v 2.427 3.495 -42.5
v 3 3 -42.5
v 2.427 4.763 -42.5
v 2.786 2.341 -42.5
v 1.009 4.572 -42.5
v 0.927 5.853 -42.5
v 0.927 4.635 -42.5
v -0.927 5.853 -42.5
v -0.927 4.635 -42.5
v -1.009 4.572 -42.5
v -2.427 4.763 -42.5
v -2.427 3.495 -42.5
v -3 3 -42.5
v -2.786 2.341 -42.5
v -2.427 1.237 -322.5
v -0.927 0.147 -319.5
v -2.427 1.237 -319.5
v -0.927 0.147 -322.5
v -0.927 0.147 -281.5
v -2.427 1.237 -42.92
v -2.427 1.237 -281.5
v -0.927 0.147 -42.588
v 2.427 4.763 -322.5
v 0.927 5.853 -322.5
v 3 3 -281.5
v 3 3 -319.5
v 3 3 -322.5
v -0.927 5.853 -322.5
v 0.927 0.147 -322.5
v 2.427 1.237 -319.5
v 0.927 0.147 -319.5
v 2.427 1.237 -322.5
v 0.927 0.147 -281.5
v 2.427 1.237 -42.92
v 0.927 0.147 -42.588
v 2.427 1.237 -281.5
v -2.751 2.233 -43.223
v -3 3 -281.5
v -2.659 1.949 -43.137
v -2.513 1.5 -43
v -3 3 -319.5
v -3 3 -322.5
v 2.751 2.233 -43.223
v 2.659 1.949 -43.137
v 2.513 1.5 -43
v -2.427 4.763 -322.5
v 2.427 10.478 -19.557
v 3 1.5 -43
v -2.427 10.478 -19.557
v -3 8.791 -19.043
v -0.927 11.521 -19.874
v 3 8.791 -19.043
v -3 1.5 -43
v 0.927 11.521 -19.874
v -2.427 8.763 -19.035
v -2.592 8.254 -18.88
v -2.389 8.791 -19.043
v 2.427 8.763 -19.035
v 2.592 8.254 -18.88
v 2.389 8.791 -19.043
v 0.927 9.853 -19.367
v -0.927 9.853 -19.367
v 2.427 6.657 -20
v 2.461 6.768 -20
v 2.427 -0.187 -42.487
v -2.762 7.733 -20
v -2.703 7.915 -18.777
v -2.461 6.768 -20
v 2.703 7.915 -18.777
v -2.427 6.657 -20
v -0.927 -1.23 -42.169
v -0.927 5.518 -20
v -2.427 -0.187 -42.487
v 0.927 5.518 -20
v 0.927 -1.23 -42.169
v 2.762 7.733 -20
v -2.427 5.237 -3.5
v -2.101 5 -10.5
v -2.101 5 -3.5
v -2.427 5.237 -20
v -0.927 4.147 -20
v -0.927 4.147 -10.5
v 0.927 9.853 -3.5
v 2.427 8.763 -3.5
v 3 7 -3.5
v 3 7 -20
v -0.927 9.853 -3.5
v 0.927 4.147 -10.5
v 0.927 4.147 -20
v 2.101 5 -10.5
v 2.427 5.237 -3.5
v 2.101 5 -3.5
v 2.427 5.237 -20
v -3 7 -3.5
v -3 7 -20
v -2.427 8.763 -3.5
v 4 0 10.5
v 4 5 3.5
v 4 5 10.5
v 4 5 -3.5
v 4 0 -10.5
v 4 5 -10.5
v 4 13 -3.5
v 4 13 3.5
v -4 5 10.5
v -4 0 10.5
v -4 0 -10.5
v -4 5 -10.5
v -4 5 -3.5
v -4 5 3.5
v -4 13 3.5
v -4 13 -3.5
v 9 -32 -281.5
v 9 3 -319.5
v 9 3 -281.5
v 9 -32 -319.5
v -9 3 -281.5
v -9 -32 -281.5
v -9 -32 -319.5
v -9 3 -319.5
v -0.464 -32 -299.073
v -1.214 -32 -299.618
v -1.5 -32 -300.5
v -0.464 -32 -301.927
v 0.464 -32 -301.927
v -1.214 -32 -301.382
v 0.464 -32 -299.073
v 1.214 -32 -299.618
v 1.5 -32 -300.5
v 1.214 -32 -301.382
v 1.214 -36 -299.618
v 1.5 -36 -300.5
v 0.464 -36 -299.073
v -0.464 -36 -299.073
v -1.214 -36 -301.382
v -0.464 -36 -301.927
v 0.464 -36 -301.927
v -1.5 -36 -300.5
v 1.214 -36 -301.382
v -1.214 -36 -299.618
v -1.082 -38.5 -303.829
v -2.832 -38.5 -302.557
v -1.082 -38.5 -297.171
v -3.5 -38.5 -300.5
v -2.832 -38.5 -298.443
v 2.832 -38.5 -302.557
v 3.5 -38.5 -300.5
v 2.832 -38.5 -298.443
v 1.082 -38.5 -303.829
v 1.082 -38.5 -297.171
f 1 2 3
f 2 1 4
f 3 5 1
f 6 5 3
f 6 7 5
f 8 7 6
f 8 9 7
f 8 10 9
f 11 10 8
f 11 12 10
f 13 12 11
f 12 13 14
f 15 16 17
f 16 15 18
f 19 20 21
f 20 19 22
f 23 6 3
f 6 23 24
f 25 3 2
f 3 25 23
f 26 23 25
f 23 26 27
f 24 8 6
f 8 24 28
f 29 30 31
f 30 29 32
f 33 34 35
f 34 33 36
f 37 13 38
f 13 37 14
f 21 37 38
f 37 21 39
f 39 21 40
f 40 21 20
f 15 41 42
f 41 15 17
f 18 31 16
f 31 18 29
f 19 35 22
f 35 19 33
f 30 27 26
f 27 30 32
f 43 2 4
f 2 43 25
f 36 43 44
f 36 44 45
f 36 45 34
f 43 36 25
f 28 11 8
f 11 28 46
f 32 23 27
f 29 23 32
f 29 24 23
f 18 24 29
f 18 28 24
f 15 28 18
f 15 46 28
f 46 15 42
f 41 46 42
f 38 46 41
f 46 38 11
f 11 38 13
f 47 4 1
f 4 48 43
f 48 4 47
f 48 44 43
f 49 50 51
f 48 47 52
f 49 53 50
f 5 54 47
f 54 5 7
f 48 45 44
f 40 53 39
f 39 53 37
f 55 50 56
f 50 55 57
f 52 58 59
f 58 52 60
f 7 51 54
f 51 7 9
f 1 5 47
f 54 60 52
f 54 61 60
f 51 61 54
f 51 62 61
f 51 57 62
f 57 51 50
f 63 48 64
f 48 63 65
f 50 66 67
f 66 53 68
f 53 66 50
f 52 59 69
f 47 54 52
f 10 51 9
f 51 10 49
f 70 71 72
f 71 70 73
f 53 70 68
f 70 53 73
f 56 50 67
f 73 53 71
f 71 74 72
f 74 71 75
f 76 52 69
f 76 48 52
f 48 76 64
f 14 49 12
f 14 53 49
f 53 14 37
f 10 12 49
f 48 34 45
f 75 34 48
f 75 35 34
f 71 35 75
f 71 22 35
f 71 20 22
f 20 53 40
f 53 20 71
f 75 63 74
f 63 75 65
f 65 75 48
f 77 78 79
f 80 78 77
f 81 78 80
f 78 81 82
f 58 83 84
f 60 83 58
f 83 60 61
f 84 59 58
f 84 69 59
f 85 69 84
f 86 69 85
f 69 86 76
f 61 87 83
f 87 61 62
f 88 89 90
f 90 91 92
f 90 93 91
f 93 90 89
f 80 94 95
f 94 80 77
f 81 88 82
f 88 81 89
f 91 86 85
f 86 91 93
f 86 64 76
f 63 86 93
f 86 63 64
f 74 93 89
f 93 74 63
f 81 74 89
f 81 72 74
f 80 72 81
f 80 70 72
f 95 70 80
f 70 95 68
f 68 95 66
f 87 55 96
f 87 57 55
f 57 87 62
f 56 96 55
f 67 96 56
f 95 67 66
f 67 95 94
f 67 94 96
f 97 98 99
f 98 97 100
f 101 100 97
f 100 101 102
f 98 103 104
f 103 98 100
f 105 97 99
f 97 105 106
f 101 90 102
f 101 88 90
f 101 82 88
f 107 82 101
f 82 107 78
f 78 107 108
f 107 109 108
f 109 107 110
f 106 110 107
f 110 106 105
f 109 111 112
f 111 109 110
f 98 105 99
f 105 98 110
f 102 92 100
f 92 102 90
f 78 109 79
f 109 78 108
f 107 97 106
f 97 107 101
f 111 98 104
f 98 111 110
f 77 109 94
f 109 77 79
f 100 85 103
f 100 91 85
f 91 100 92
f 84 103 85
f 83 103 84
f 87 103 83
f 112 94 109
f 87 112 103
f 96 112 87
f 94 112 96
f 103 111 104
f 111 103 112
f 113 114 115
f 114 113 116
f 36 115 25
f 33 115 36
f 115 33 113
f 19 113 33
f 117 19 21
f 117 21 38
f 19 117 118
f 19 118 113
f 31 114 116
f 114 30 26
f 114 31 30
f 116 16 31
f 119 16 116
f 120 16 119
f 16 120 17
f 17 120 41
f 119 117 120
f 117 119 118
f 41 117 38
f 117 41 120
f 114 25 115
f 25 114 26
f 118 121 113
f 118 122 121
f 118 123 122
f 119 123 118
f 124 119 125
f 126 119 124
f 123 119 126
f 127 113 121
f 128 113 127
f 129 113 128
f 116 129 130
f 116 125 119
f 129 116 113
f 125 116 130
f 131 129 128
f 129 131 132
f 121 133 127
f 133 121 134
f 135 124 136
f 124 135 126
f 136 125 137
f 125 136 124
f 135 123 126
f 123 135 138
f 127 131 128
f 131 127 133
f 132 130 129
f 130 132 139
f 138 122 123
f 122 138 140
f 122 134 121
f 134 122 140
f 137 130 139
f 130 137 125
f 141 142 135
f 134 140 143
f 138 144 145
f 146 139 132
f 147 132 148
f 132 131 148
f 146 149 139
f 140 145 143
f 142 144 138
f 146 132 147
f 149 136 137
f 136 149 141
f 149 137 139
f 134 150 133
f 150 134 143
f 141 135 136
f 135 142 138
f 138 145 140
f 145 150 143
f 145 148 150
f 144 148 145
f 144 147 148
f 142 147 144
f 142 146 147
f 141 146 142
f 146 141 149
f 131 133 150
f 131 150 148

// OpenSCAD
/*
^  |
l1 |
|  |
v  | < h >
^   \
l2   \
|     \
v      \
^       |
l3      |
|       |
v       |
*/
module bras_seul(l1,l2,l3,h,d) {
    translate([0,d/2,-l1-l2-l3+0.5])
        cylinder(d=d, h=l3);
    translate([0,d/4,-l1-l2])
        rotate([-atan((h-d/2)/l2),0,0])
        cylinder(d=d, h=sqrt(l2^2 + (h-d/2)^2)+1);
    translate([0,h-d/2,-l1])
        cylinder(d=d, h=l1);
}

module fixation(L,l,H,h,e) {
    // Base
    translate([0,h/2,0])
        cube(size=[e, h, L], center=true);
    // Articulation
    translate([0,H/2,0])
        cube(size=[e, H, l], center=true);
}
// fixation(21,7,13,5,8);

module poids(){
    color("orange")
    translate([0, -5, 0])
    cube(size=[18, 35, 38], center=true);
    
    color("grey")
    translate([0, -25/2-10, 0]) 
    rotate([90, 0, 0])
    cylinder(d=3, h=4, $fn=10);

    color("grey")
    translate([0, -25/2-3-11, 0]) 
    rotate([90, 0, 0])
    cylinder(d1=3, d2=7, h=2.5, $fn=10);
}

module bras(l1,l2,l3,h,d) {
    color("grey") bras_seul(l1, l2, l3, h, d);
    color("grey") fixation(21, 7, 13, 5, 8);
    translate([0,-25/2+d/2,-l1-l2-l3+45/2])
        poids();
}

module bras_ogma()
    bras(20, 23, 280, 10, 6);

bras_ogma();
